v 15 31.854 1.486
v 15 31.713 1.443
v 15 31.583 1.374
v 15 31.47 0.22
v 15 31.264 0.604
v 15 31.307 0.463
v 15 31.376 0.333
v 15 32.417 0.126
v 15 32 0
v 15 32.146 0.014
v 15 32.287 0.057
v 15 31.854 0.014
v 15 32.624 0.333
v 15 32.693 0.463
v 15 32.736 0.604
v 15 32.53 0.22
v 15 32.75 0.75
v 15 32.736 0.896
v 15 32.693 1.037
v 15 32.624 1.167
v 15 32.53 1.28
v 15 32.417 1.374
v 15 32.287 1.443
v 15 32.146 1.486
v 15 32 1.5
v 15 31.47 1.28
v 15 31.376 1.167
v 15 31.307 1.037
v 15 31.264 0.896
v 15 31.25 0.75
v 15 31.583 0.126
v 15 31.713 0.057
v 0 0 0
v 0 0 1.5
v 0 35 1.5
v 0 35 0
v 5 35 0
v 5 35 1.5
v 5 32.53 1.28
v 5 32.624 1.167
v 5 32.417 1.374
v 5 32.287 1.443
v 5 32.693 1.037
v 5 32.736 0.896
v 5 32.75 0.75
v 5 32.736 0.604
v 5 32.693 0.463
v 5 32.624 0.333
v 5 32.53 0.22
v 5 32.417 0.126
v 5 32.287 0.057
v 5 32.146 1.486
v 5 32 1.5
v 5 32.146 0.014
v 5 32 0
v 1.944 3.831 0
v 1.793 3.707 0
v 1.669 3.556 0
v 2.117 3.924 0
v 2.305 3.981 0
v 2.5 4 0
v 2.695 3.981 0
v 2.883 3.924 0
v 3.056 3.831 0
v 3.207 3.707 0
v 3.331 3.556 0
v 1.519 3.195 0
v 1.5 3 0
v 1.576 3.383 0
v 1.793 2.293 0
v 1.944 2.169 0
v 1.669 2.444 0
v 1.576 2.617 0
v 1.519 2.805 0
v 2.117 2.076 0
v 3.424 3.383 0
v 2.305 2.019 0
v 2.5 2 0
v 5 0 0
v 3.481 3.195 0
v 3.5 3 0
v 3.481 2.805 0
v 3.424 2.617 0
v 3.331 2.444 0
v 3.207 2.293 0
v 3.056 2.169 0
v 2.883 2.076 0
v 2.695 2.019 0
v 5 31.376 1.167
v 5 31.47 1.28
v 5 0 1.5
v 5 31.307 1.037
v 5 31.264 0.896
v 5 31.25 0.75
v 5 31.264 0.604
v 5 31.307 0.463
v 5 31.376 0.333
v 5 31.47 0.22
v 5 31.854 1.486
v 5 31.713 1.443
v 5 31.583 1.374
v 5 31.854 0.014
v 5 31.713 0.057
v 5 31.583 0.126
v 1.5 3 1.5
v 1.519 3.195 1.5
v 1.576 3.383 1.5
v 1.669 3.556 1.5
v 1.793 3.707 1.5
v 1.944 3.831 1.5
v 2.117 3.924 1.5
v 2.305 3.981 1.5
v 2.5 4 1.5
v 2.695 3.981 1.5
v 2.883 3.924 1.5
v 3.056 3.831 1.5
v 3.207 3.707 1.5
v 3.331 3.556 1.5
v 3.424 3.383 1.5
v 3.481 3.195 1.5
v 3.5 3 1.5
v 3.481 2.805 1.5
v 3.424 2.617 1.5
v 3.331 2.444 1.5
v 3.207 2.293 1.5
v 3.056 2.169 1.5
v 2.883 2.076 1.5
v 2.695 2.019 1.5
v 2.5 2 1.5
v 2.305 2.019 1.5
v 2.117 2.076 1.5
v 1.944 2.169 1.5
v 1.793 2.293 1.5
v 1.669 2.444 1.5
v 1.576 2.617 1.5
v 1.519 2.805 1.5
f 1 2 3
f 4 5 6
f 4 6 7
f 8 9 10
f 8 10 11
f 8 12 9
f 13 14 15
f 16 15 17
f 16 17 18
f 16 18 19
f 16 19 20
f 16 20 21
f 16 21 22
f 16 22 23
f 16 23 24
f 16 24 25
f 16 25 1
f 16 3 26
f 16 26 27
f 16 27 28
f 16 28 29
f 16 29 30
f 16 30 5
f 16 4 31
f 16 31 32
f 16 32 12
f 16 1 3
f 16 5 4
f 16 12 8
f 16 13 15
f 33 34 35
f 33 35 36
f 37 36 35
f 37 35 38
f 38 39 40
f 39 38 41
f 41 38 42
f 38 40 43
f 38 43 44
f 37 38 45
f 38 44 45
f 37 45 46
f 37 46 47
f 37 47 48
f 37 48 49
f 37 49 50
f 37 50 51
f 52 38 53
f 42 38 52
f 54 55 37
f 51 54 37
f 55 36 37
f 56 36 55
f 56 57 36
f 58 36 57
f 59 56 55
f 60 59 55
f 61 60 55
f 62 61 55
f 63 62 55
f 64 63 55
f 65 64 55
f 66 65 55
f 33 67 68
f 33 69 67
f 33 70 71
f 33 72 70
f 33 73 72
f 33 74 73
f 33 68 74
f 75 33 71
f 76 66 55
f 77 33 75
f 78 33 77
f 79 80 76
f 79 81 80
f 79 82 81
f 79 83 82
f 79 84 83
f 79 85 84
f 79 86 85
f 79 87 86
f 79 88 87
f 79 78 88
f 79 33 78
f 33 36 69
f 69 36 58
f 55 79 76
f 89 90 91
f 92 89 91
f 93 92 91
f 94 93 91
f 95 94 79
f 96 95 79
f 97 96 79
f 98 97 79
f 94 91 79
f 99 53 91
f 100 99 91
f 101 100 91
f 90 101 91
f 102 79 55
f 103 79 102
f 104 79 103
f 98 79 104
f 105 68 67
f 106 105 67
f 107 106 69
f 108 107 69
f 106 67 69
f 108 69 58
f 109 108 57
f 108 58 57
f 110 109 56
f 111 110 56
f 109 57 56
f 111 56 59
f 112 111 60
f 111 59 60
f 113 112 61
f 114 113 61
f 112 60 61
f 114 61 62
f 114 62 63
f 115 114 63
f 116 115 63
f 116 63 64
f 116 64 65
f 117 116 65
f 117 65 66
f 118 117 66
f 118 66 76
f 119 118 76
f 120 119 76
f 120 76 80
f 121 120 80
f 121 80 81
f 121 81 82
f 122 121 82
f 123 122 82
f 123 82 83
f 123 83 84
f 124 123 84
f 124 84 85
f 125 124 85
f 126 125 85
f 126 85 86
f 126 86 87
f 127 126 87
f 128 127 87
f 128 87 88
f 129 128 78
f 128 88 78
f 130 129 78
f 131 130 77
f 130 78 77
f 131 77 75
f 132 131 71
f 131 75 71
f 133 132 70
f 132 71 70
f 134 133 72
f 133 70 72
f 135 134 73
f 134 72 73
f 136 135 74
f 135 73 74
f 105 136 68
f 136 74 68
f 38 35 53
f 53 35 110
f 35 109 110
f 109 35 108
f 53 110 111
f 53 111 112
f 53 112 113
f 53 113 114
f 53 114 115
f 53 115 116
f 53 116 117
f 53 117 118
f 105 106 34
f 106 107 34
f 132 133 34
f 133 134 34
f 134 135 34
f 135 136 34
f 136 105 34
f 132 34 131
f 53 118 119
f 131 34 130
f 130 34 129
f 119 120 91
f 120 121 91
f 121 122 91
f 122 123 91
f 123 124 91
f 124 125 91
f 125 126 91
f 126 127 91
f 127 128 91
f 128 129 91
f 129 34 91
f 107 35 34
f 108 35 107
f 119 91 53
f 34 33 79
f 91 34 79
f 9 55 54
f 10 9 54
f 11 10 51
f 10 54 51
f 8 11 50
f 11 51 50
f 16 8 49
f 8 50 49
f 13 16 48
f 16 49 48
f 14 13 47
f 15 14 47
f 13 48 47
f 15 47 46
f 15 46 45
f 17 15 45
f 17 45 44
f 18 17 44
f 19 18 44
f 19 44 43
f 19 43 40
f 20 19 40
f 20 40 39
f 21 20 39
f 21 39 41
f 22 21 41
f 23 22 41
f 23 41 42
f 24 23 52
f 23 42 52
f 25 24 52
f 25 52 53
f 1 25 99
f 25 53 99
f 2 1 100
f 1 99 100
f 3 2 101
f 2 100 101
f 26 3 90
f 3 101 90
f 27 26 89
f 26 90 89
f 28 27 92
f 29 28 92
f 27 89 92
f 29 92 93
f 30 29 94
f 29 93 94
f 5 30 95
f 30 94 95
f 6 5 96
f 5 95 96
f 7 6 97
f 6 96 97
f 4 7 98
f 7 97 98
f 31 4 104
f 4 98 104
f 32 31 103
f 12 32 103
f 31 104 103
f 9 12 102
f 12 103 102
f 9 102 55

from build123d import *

# Parameters (mm, degrees)
SKETCH1_W               = 5
SKETCH1_H               = 1.5
BOSS_EXTRUDE1_DEPTH     = 35
SKETCH2_R               = 1
CUT_EXTRUDE1_DEPTH      = 1
CUT_EXTRUDE1_DEPTH_BACK = 2.5
SKETCH3_R               = 0.75
BOSS_EXTRUDE2_DEPTH     = 10


with BuildPart() as part:
    # Sketch1 → Boss-Extrude1 (new body)
    with BuildSketch(Plane(origin=(0, 0, 0), x_dir=(1, 0, 0), z_dir=(0, 1, 0))):
        with Locations((2.5, -0.75)):
            Rectangle(SKETCH1_W, SKETCH1_H)
    extrude(amount=BOSS_EXTRUDE1_DEPTH)

    # Sketch2 → Cut-Extrude1 (cut, two sides)
    with BuildSketch(Plane(origin=(0, 0, 0), x_dir=(-1, 0, 0), z_dir=(0, 0, -1))) as cut_extrude1_sk:
        with Locations((-2.5, 3)):
            Circle(SKETCH2_R)
    extrude(amount=CUT_EXTRUDE1_DEPTH, mode=Mode.SUBTRACT)
    extrude(cut_extrude1_sk.sketch, amount=-CUT_EXTRUDE1_DEPTH_BACK, mode=Mode.SUBTRACT)

    # Sketch3 → Boss-Extrude2 (add)
    with BuildSketch(Plane(origin=(5, 0, 0), x_dir=(0, 0, -1), z_dir=(1, 0, 0))):
        with Locations((-0.75, 32)):
            Circle(SKETCH3_R)
    extrude(amount=BOSS_EXTRUDE2_DEPTH)


solid = part.part
